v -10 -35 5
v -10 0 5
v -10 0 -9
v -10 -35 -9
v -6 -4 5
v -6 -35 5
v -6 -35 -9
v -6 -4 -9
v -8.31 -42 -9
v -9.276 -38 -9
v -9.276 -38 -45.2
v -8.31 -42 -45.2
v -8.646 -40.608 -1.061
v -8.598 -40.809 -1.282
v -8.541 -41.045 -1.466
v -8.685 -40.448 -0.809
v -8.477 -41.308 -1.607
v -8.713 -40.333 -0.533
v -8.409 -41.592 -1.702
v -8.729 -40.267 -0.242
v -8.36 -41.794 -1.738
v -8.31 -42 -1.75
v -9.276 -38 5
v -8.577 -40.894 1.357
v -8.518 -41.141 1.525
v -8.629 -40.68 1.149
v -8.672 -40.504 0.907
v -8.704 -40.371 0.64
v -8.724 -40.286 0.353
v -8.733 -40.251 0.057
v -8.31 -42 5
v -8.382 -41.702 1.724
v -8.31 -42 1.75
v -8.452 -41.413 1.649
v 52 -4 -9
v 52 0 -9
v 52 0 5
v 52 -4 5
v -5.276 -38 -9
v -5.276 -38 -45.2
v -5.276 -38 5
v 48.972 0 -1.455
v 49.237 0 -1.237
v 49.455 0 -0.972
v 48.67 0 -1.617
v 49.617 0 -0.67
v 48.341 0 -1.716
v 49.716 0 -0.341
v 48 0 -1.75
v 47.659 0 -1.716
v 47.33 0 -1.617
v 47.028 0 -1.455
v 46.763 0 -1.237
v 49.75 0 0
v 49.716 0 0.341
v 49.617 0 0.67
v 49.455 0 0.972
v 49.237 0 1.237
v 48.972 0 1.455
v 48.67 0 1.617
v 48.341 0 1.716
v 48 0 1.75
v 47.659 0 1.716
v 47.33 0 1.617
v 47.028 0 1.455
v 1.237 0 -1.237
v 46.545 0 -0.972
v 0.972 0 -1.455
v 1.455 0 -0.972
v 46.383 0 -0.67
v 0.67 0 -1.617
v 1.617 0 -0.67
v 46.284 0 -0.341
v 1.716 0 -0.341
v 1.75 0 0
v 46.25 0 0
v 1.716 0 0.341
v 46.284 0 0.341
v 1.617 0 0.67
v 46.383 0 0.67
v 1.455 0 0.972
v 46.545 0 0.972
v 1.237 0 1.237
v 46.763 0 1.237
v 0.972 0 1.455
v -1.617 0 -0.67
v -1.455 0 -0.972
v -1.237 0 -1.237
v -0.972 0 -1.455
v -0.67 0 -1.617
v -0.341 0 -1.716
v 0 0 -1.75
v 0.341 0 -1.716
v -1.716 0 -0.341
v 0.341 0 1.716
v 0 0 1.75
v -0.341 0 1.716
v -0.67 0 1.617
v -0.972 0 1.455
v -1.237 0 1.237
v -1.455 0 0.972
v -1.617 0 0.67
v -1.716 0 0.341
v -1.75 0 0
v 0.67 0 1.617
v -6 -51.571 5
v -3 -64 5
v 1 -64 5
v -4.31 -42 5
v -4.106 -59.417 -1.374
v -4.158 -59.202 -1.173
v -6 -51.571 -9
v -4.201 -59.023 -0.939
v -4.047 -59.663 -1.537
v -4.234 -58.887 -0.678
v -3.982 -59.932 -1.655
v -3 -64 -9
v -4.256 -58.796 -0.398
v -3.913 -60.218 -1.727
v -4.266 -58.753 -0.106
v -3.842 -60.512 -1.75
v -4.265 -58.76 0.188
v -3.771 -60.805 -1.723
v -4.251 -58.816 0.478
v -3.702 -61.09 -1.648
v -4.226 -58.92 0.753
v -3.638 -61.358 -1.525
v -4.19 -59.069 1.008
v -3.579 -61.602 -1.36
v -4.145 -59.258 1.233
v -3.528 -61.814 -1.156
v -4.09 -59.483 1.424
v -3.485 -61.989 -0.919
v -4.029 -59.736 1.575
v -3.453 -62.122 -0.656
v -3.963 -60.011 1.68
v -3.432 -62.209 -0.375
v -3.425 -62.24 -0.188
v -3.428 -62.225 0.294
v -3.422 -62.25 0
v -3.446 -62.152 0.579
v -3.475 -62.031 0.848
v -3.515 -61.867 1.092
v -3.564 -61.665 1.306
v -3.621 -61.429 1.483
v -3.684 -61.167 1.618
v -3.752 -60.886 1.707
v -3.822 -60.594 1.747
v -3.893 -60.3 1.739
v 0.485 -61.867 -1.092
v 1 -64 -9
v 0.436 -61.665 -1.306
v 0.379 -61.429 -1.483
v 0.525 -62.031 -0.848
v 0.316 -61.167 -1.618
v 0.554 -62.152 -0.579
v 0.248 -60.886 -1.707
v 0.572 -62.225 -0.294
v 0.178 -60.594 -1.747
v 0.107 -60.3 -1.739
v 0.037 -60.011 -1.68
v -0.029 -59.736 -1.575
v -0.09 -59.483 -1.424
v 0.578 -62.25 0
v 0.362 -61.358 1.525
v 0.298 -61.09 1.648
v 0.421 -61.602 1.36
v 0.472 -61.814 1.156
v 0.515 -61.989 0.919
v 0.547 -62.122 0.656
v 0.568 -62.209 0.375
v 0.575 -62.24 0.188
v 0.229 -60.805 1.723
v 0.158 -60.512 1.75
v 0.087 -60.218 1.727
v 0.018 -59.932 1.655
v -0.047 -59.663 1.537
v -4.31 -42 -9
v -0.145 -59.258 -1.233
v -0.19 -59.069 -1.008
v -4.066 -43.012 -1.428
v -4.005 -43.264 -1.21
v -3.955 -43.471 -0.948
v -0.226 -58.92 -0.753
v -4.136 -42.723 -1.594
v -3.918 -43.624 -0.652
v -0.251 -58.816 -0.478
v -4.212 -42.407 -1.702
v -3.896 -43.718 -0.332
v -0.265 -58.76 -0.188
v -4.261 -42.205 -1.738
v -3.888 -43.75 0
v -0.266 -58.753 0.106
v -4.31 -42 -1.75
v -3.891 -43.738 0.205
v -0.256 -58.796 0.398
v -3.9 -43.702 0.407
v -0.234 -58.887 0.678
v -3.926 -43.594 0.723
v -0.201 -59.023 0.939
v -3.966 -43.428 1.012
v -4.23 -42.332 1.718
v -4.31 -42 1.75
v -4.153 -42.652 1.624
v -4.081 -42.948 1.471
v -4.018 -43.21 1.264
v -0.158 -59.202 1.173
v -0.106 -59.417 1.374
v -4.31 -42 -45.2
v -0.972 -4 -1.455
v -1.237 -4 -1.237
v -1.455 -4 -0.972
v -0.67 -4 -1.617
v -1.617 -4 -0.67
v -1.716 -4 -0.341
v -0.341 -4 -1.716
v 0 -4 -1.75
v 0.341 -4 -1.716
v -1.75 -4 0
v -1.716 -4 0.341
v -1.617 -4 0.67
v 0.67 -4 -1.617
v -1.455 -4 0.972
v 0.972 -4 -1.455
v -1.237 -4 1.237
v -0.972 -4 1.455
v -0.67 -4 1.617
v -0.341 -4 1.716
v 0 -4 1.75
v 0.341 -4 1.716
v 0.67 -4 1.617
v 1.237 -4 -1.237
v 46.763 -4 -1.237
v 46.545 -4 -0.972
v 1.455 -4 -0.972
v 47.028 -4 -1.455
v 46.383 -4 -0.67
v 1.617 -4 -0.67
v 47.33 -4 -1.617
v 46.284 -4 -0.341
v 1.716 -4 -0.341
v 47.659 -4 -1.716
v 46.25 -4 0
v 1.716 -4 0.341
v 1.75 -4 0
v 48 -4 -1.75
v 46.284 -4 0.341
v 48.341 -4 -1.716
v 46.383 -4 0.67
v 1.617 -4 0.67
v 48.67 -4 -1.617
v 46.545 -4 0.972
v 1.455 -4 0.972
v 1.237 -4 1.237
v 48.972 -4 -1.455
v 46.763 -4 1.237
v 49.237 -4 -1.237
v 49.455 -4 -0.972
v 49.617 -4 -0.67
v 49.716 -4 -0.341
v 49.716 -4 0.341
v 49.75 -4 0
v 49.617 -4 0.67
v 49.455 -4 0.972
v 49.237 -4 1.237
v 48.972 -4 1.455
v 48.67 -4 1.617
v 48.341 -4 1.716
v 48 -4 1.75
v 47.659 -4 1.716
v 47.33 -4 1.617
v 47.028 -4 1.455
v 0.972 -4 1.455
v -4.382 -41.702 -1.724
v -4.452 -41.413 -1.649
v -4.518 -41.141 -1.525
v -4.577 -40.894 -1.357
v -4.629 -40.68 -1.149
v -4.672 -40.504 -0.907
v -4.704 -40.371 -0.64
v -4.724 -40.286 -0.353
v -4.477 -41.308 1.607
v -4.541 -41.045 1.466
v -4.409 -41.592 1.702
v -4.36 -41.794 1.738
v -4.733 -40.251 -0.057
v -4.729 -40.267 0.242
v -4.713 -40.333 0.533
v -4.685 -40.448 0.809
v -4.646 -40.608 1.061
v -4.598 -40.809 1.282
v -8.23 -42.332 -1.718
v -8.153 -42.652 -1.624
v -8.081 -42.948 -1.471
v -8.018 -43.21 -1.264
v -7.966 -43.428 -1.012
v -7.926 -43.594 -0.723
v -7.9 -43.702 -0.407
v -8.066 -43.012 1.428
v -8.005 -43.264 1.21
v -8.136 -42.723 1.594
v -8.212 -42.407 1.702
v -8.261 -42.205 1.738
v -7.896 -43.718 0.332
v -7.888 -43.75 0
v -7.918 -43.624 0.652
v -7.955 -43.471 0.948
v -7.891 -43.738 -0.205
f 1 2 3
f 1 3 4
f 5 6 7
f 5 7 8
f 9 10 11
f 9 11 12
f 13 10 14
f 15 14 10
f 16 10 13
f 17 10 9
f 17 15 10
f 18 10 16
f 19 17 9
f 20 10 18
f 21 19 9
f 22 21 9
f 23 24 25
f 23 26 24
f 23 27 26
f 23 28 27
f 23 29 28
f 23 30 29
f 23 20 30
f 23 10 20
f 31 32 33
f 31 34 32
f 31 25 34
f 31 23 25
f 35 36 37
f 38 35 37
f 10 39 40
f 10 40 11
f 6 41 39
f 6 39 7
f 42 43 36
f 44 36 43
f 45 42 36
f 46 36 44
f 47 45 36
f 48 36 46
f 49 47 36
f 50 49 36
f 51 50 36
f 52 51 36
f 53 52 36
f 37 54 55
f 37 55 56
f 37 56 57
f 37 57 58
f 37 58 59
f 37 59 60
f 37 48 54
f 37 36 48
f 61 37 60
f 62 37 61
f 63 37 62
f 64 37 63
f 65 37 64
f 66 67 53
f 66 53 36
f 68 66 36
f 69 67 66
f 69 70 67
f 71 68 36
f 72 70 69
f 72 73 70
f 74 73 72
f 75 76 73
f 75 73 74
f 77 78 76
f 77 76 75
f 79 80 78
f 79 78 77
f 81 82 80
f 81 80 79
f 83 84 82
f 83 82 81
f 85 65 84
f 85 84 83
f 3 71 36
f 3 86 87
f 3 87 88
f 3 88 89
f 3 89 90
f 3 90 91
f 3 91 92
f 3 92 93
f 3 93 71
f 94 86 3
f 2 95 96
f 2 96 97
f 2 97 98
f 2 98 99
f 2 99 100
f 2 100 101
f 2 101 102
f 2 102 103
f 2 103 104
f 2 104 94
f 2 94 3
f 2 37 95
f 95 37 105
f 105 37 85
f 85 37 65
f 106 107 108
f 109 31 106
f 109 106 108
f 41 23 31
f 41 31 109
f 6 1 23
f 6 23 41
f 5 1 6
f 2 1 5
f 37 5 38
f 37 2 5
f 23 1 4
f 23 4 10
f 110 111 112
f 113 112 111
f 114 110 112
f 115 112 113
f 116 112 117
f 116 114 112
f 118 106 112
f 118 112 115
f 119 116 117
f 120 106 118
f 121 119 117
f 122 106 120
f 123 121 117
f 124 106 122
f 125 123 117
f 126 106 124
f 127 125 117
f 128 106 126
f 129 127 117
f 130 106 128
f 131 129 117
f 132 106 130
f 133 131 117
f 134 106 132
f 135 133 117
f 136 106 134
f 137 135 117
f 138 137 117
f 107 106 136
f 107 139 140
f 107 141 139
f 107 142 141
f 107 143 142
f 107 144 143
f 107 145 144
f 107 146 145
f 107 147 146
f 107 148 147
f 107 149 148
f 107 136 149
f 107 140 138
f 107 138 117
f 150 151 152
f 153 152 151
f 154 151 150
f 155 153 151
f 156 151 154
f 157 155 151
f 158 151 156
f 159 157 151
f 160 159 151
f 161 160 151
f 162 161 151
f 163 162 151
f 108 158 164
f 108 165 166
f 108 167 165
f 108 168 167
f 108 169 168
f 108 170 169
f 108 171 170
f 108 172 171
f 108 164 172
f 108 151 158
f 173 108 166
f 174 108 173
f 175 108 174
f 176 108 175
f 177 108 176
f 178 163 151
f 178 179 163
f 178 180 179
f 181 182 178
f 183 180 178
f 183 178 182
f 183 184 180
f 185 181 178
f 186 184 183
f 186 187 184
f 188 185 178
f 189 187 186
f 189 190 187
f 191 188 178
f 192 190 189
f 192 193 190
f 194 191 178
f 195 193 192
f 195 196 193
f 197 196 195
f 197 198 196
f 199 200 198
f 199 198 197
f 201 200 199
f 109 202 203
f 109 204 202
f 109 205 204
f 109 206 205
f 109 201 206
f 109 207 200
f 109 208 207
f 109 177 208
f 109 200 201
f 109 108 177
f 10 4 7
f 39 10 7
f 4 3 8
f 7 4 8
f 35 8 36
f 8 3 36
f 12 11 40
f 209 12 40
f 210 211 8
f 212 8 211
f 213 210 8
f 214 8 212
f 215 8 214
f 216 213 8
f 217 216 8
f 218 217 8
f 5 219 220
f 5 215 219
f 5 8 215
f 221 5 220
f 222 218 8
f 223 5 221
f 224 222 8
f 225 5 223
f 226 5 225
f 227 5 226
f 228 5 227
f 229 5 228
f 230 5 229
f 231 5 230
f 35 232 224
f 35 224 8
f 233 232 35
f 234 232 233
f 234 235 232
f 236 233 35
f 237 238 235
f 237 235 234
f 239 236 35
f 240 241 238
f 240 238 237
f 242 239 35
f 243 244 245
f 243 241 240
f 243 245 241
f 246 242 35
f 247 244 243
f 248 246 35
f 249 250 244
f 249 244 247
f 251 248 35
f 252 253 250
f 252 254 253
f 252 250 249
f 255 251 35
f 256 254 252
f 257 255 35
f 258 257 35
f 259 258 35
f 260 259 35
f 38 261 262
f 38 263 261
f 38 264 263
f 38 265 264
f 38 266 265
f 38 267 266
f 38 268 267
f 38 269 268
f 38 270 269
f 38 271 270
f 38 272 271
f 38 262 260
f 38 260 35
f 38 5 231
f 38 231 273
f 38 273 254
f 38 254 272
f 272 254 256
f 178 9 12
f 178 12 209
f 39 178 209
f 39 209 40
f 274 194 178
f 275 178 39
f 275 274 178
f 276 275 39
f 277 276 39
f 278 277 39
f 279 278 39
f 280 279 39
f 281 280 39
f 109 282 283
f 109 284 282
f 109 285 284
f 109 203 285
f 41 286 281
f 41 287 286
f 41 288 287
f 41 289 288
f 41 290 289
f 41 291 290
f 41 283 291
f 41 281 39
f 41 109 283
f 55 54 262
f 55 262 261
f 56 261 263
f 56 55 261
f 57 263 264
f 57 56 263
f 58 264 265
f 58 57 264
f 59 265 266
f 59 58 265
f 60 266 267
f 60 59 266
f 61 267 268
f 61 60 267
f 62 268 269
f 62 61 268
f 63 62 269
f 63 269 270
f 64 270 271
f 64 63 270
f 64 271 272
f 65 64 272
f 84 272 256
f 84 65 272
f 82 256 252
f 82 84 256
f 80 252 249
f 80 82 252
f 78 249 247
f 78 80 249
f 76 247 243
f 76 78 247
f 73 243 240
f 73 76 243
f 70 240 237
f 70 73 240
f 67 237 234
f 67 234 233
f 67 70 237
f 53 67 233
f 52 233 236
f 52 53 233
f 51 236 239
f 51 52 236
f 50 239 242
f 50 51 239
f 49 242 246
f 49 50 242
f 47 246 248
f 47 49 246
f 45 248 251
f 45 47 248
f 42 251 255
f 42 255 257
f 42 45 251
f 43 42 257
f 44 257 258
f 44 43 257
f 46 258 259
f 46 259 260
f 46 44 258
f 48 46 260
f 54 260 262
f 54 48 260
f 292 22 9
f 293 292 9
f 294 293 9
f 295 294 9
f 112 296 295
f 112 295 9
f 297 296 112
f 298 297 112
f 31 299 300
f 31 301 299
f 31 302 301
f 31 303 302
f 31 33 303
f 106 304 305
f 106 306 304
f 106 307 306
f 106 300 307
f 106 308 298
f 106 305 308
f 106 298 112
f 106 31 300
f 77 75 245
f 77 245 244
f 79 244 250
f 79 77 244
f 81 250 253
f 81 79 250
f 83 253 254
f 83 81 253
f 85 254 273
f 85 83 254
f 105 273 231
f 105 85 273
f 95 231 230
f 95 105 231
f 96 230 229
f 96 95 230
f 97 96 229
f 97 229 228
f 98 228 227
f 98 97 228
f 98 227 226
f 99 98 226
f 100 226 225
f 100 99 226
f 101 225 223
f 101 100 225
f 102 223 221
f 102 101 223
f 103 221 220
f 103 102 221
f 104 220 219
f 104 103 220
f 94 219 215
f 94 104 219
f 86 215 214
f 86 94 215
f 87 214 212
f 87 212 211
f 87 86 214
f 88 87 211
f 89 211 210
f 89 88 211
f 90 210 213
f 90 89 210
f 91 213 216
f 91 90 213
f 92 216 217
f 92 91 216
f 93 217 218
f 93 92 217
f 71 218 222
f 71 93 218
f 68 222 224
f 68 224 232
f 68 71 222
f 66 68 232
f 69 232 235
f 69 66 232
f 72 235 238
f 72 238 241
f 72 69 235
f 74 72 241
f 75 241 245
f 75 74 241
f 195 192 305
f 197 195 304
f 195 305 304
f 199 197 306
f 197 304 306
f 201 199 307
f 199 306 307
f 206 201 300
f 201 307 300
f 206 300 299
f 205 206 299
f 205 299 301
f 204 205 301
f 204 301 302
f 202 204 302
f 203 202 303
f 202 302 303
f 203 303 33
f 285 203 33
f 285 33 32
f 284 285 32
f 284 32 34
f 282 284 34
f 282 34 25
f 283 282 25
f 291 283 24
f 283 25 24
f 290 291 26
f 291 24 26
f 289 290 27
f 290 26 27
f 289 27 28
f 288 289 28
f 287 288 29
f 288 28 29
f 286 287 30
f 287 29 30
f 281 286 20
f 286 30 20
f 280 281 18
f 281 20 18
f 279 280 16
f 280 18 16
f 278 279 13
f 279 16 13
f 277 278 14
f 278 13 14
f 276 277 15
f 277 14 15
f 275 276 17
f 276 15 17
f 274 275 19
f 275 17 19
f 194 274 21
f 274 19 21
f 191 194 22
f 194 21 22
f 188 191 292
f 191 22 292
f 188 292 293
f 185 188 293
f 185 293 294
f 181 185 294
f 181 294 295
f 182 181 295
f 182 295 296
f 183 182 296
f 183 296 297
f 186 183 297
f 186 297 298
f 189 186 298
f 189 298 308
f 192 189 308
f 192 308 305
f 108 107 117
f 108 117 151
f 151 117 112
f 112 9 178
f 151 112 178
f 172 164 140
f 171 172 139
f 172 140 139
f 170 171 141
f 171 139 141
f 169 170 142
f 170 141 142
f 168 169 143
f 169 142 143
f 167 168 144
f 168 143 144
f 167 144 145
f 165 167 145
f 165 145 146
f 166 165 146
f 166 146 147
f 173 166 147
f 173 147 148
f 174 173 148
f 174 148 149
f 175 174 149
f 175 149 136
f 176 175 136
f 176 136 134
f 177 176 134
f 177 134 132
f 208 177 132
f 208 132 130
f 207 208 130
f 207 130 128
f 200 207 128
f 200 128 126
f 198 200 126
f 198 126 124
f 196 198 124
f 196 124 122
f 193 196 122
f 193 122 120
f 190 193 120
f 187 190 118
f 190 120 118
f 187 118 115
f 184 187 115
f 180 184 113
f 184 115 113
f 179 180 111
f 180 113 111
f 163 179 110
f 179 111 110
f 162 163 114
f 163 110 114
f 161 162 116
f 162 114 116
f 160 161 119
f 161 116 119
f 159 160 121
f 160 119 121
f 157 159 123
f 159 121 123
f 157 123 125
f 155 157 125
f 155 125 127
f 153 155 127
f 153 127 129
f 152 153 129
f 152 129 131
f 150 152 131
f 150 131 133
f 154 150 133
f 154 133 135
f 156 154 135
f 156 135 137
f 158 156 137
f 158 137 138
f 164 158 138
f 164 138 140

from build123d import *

# Parameters (mm, degrees)
F0_R     = 1.75
F1_DEPTH = 4
F4_DEPTH = 14
F6_DEPTH = 50.2
F5_R     = 1.75
F7_DEPTH = 71


# Not quite as in the source:
# - a feature names something its author has since deleted; it is built from what else it names


with BuildPart() as f1:
    # F0 (on Front) → F1 (new body)
    with BuildSketch(Plane.XZ):
        Polygon((-6, 5), (-6, 0), (-6, -9), (52, -9), (52, 0), (52, 5), align=None)
        Circle(F0_R, mode=Mode.SUBTRACT)
        with Locations((48, 0)):
            Circle(F0_R, mode=Mode.SUBTRACT)
    extrude(amount=F1_DEPTH)

    # F3 (on face) → F4 (join)
    with BuildSketch(Plane.XY.offset(5)):
        Polygon((-10, 0), (-10, -35), (-6, -35), (-6, -4), (-6, 0), align=None)
        Polygon((-6, -35), (-10, -35), (-9.275862069, -38), (-6, -38), align=None)
        Polygon((-5.275862069, -38), (-6, -35), (-6, -38), align=None)
        Polygon((-6, -38), (-9.275862069, -38), (-8.3103448276, -42), (-6, -42), align=None)
        Polygon((-4.3103448276, -42), (-5.275862069, -38), (-6, -38), (-6, -42), align=None)
        Polygon((-6, -42), (-8.3103448276, -42), (-6, -51.5714285714), align=None)
        Polygon((1, -64), (-4.3103448276, -42), (-6, -42), (-6, -51.5714285714), (-3, -64), align=None)
    extrude(amount=-F4_DEPTH)

    # F3 (on face) → F6 (join)
    with BuildSketch(Plane.XY.offset(5)):
        Polygon((-6, -38), (-9.275862069, -38), (-8.3103448276, -42), (-6, -42), align=None)
        Polygon((-4.3103448276, -42), (-5.275862069, -38), (-6, -38), (-6, -42), align=None)
    extrude(amount=-F6_DEPTH)

    # F5 (on face) → F7 (cut)
    with BuildSketch(Plane(origin=(-10, 0, 0), x_dir=(0, -1, 0), z_dir=(-1, 0, 0))):
        with Locations((42, 0)):
            Circle(F5_R)
        with Locations((60.5, 0)):
            Circle(F5_R)
    extrude(amount=-F7_DEPTH, mode=Mode.SUBTRACT)


solid = f1.part
